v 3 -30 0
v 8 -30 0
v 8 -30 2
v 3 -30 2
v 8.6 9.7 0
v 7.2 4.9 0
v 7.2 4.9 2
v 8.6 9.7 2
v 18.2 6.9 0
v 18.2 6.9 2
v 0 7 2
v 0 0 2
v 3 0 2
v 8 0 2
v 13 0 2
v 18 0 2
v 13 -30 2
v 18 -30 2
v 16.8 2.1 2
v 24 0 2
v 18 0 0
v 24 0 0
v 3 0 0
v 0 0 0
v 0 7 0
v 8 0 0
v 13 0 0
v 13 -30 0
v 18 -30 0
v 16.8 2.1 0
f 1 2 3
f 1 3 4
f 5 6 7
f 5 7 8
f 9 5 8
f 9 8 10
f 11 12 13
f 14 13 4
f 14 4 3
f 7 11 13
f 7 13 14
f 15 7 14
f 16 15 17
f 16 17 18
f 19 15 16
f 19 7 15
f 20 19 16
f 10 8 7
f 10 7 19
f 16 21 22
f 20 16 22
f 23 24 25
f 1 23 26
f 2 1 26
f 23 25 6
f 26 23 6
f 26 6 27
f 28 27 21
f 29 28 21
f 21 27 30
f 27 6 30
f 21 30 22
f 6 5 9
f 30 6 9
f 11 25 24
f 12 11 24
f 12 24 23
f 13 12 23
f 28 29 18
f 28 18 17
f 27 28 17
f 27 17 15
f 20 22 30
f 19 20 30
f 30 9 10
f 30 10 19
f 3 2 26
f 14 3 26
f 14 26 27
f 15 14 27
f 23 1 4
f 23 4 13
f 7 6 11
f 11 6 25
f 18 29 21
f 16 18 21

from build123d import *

# Parameters (mm, degrees)
SKETCH1_W           = 5
SKETCH1_H           = 100
BOSS_EXTRUDE1_DEPTH = 2
SKETCH2_W           = 5
SKETCH2_H           = 2
CUT_EXTRUDE1_DEPTH  = 50
SKETCH3_W           = 5
SKETCH3_H           = 2
CUT_EXTRUDE2_DEPTH  = 20


with BuildPart() as part:
    # Sketch1 → Boss-Extrude1 (new body)
    with BuildSketch(Plane.XY):
        with Locations((5.5, -50)):
            Rectangle(SKETCH1_W, SKETCH1_H)
        with Locations((15.5, -50)):
            Rectangle(SKETCH1_W, SKETCH1_H)
        Polygon((24, 0), (0, 7), (0, 0), align=None)
        Polygon((8.6, 9.7), (18.2, 6.9), (16.8, 2.1), (7.2, 4.9), align=None)
    extrude(amount=BOSS_EXTRUDE1_DEPTH)

    # Sketch2 → Cut-Extrude1 (cut)
    with BuildSketch(Plane.XZ.offset(100)):
        with Locations((5.5, 1)):
            Rectangle(SKETCH2_W, SKETCH2_H)
        with Locations((15.5, 1)):
            Rectangle(SKETCH2_W, SKETCH2_H)
    extrude(amount=-CUT_EXTRUDE1_DEPTH, mode=Mode.SUBTRACT)

    # Sketch3 → Cut-Extrude2 (cut)
    with BuildSketch(Plane(origin=(0, -50, 0), x_dir=(-1, 0, 0), z_dir=(0, -1, 0))):
        with Locations((-5.5, -1)):
            Rectangle(SKETCH3_W, SKETCH3_H)
        with Locations((-15.5, -1)):
            Rectangle(SKETCH3_W, SKETCH3_H)
    extrude(amount=-CUT_EXTRUDE2_DEPTH, mode=Mode.SUBTRACT)


solid = part.part
